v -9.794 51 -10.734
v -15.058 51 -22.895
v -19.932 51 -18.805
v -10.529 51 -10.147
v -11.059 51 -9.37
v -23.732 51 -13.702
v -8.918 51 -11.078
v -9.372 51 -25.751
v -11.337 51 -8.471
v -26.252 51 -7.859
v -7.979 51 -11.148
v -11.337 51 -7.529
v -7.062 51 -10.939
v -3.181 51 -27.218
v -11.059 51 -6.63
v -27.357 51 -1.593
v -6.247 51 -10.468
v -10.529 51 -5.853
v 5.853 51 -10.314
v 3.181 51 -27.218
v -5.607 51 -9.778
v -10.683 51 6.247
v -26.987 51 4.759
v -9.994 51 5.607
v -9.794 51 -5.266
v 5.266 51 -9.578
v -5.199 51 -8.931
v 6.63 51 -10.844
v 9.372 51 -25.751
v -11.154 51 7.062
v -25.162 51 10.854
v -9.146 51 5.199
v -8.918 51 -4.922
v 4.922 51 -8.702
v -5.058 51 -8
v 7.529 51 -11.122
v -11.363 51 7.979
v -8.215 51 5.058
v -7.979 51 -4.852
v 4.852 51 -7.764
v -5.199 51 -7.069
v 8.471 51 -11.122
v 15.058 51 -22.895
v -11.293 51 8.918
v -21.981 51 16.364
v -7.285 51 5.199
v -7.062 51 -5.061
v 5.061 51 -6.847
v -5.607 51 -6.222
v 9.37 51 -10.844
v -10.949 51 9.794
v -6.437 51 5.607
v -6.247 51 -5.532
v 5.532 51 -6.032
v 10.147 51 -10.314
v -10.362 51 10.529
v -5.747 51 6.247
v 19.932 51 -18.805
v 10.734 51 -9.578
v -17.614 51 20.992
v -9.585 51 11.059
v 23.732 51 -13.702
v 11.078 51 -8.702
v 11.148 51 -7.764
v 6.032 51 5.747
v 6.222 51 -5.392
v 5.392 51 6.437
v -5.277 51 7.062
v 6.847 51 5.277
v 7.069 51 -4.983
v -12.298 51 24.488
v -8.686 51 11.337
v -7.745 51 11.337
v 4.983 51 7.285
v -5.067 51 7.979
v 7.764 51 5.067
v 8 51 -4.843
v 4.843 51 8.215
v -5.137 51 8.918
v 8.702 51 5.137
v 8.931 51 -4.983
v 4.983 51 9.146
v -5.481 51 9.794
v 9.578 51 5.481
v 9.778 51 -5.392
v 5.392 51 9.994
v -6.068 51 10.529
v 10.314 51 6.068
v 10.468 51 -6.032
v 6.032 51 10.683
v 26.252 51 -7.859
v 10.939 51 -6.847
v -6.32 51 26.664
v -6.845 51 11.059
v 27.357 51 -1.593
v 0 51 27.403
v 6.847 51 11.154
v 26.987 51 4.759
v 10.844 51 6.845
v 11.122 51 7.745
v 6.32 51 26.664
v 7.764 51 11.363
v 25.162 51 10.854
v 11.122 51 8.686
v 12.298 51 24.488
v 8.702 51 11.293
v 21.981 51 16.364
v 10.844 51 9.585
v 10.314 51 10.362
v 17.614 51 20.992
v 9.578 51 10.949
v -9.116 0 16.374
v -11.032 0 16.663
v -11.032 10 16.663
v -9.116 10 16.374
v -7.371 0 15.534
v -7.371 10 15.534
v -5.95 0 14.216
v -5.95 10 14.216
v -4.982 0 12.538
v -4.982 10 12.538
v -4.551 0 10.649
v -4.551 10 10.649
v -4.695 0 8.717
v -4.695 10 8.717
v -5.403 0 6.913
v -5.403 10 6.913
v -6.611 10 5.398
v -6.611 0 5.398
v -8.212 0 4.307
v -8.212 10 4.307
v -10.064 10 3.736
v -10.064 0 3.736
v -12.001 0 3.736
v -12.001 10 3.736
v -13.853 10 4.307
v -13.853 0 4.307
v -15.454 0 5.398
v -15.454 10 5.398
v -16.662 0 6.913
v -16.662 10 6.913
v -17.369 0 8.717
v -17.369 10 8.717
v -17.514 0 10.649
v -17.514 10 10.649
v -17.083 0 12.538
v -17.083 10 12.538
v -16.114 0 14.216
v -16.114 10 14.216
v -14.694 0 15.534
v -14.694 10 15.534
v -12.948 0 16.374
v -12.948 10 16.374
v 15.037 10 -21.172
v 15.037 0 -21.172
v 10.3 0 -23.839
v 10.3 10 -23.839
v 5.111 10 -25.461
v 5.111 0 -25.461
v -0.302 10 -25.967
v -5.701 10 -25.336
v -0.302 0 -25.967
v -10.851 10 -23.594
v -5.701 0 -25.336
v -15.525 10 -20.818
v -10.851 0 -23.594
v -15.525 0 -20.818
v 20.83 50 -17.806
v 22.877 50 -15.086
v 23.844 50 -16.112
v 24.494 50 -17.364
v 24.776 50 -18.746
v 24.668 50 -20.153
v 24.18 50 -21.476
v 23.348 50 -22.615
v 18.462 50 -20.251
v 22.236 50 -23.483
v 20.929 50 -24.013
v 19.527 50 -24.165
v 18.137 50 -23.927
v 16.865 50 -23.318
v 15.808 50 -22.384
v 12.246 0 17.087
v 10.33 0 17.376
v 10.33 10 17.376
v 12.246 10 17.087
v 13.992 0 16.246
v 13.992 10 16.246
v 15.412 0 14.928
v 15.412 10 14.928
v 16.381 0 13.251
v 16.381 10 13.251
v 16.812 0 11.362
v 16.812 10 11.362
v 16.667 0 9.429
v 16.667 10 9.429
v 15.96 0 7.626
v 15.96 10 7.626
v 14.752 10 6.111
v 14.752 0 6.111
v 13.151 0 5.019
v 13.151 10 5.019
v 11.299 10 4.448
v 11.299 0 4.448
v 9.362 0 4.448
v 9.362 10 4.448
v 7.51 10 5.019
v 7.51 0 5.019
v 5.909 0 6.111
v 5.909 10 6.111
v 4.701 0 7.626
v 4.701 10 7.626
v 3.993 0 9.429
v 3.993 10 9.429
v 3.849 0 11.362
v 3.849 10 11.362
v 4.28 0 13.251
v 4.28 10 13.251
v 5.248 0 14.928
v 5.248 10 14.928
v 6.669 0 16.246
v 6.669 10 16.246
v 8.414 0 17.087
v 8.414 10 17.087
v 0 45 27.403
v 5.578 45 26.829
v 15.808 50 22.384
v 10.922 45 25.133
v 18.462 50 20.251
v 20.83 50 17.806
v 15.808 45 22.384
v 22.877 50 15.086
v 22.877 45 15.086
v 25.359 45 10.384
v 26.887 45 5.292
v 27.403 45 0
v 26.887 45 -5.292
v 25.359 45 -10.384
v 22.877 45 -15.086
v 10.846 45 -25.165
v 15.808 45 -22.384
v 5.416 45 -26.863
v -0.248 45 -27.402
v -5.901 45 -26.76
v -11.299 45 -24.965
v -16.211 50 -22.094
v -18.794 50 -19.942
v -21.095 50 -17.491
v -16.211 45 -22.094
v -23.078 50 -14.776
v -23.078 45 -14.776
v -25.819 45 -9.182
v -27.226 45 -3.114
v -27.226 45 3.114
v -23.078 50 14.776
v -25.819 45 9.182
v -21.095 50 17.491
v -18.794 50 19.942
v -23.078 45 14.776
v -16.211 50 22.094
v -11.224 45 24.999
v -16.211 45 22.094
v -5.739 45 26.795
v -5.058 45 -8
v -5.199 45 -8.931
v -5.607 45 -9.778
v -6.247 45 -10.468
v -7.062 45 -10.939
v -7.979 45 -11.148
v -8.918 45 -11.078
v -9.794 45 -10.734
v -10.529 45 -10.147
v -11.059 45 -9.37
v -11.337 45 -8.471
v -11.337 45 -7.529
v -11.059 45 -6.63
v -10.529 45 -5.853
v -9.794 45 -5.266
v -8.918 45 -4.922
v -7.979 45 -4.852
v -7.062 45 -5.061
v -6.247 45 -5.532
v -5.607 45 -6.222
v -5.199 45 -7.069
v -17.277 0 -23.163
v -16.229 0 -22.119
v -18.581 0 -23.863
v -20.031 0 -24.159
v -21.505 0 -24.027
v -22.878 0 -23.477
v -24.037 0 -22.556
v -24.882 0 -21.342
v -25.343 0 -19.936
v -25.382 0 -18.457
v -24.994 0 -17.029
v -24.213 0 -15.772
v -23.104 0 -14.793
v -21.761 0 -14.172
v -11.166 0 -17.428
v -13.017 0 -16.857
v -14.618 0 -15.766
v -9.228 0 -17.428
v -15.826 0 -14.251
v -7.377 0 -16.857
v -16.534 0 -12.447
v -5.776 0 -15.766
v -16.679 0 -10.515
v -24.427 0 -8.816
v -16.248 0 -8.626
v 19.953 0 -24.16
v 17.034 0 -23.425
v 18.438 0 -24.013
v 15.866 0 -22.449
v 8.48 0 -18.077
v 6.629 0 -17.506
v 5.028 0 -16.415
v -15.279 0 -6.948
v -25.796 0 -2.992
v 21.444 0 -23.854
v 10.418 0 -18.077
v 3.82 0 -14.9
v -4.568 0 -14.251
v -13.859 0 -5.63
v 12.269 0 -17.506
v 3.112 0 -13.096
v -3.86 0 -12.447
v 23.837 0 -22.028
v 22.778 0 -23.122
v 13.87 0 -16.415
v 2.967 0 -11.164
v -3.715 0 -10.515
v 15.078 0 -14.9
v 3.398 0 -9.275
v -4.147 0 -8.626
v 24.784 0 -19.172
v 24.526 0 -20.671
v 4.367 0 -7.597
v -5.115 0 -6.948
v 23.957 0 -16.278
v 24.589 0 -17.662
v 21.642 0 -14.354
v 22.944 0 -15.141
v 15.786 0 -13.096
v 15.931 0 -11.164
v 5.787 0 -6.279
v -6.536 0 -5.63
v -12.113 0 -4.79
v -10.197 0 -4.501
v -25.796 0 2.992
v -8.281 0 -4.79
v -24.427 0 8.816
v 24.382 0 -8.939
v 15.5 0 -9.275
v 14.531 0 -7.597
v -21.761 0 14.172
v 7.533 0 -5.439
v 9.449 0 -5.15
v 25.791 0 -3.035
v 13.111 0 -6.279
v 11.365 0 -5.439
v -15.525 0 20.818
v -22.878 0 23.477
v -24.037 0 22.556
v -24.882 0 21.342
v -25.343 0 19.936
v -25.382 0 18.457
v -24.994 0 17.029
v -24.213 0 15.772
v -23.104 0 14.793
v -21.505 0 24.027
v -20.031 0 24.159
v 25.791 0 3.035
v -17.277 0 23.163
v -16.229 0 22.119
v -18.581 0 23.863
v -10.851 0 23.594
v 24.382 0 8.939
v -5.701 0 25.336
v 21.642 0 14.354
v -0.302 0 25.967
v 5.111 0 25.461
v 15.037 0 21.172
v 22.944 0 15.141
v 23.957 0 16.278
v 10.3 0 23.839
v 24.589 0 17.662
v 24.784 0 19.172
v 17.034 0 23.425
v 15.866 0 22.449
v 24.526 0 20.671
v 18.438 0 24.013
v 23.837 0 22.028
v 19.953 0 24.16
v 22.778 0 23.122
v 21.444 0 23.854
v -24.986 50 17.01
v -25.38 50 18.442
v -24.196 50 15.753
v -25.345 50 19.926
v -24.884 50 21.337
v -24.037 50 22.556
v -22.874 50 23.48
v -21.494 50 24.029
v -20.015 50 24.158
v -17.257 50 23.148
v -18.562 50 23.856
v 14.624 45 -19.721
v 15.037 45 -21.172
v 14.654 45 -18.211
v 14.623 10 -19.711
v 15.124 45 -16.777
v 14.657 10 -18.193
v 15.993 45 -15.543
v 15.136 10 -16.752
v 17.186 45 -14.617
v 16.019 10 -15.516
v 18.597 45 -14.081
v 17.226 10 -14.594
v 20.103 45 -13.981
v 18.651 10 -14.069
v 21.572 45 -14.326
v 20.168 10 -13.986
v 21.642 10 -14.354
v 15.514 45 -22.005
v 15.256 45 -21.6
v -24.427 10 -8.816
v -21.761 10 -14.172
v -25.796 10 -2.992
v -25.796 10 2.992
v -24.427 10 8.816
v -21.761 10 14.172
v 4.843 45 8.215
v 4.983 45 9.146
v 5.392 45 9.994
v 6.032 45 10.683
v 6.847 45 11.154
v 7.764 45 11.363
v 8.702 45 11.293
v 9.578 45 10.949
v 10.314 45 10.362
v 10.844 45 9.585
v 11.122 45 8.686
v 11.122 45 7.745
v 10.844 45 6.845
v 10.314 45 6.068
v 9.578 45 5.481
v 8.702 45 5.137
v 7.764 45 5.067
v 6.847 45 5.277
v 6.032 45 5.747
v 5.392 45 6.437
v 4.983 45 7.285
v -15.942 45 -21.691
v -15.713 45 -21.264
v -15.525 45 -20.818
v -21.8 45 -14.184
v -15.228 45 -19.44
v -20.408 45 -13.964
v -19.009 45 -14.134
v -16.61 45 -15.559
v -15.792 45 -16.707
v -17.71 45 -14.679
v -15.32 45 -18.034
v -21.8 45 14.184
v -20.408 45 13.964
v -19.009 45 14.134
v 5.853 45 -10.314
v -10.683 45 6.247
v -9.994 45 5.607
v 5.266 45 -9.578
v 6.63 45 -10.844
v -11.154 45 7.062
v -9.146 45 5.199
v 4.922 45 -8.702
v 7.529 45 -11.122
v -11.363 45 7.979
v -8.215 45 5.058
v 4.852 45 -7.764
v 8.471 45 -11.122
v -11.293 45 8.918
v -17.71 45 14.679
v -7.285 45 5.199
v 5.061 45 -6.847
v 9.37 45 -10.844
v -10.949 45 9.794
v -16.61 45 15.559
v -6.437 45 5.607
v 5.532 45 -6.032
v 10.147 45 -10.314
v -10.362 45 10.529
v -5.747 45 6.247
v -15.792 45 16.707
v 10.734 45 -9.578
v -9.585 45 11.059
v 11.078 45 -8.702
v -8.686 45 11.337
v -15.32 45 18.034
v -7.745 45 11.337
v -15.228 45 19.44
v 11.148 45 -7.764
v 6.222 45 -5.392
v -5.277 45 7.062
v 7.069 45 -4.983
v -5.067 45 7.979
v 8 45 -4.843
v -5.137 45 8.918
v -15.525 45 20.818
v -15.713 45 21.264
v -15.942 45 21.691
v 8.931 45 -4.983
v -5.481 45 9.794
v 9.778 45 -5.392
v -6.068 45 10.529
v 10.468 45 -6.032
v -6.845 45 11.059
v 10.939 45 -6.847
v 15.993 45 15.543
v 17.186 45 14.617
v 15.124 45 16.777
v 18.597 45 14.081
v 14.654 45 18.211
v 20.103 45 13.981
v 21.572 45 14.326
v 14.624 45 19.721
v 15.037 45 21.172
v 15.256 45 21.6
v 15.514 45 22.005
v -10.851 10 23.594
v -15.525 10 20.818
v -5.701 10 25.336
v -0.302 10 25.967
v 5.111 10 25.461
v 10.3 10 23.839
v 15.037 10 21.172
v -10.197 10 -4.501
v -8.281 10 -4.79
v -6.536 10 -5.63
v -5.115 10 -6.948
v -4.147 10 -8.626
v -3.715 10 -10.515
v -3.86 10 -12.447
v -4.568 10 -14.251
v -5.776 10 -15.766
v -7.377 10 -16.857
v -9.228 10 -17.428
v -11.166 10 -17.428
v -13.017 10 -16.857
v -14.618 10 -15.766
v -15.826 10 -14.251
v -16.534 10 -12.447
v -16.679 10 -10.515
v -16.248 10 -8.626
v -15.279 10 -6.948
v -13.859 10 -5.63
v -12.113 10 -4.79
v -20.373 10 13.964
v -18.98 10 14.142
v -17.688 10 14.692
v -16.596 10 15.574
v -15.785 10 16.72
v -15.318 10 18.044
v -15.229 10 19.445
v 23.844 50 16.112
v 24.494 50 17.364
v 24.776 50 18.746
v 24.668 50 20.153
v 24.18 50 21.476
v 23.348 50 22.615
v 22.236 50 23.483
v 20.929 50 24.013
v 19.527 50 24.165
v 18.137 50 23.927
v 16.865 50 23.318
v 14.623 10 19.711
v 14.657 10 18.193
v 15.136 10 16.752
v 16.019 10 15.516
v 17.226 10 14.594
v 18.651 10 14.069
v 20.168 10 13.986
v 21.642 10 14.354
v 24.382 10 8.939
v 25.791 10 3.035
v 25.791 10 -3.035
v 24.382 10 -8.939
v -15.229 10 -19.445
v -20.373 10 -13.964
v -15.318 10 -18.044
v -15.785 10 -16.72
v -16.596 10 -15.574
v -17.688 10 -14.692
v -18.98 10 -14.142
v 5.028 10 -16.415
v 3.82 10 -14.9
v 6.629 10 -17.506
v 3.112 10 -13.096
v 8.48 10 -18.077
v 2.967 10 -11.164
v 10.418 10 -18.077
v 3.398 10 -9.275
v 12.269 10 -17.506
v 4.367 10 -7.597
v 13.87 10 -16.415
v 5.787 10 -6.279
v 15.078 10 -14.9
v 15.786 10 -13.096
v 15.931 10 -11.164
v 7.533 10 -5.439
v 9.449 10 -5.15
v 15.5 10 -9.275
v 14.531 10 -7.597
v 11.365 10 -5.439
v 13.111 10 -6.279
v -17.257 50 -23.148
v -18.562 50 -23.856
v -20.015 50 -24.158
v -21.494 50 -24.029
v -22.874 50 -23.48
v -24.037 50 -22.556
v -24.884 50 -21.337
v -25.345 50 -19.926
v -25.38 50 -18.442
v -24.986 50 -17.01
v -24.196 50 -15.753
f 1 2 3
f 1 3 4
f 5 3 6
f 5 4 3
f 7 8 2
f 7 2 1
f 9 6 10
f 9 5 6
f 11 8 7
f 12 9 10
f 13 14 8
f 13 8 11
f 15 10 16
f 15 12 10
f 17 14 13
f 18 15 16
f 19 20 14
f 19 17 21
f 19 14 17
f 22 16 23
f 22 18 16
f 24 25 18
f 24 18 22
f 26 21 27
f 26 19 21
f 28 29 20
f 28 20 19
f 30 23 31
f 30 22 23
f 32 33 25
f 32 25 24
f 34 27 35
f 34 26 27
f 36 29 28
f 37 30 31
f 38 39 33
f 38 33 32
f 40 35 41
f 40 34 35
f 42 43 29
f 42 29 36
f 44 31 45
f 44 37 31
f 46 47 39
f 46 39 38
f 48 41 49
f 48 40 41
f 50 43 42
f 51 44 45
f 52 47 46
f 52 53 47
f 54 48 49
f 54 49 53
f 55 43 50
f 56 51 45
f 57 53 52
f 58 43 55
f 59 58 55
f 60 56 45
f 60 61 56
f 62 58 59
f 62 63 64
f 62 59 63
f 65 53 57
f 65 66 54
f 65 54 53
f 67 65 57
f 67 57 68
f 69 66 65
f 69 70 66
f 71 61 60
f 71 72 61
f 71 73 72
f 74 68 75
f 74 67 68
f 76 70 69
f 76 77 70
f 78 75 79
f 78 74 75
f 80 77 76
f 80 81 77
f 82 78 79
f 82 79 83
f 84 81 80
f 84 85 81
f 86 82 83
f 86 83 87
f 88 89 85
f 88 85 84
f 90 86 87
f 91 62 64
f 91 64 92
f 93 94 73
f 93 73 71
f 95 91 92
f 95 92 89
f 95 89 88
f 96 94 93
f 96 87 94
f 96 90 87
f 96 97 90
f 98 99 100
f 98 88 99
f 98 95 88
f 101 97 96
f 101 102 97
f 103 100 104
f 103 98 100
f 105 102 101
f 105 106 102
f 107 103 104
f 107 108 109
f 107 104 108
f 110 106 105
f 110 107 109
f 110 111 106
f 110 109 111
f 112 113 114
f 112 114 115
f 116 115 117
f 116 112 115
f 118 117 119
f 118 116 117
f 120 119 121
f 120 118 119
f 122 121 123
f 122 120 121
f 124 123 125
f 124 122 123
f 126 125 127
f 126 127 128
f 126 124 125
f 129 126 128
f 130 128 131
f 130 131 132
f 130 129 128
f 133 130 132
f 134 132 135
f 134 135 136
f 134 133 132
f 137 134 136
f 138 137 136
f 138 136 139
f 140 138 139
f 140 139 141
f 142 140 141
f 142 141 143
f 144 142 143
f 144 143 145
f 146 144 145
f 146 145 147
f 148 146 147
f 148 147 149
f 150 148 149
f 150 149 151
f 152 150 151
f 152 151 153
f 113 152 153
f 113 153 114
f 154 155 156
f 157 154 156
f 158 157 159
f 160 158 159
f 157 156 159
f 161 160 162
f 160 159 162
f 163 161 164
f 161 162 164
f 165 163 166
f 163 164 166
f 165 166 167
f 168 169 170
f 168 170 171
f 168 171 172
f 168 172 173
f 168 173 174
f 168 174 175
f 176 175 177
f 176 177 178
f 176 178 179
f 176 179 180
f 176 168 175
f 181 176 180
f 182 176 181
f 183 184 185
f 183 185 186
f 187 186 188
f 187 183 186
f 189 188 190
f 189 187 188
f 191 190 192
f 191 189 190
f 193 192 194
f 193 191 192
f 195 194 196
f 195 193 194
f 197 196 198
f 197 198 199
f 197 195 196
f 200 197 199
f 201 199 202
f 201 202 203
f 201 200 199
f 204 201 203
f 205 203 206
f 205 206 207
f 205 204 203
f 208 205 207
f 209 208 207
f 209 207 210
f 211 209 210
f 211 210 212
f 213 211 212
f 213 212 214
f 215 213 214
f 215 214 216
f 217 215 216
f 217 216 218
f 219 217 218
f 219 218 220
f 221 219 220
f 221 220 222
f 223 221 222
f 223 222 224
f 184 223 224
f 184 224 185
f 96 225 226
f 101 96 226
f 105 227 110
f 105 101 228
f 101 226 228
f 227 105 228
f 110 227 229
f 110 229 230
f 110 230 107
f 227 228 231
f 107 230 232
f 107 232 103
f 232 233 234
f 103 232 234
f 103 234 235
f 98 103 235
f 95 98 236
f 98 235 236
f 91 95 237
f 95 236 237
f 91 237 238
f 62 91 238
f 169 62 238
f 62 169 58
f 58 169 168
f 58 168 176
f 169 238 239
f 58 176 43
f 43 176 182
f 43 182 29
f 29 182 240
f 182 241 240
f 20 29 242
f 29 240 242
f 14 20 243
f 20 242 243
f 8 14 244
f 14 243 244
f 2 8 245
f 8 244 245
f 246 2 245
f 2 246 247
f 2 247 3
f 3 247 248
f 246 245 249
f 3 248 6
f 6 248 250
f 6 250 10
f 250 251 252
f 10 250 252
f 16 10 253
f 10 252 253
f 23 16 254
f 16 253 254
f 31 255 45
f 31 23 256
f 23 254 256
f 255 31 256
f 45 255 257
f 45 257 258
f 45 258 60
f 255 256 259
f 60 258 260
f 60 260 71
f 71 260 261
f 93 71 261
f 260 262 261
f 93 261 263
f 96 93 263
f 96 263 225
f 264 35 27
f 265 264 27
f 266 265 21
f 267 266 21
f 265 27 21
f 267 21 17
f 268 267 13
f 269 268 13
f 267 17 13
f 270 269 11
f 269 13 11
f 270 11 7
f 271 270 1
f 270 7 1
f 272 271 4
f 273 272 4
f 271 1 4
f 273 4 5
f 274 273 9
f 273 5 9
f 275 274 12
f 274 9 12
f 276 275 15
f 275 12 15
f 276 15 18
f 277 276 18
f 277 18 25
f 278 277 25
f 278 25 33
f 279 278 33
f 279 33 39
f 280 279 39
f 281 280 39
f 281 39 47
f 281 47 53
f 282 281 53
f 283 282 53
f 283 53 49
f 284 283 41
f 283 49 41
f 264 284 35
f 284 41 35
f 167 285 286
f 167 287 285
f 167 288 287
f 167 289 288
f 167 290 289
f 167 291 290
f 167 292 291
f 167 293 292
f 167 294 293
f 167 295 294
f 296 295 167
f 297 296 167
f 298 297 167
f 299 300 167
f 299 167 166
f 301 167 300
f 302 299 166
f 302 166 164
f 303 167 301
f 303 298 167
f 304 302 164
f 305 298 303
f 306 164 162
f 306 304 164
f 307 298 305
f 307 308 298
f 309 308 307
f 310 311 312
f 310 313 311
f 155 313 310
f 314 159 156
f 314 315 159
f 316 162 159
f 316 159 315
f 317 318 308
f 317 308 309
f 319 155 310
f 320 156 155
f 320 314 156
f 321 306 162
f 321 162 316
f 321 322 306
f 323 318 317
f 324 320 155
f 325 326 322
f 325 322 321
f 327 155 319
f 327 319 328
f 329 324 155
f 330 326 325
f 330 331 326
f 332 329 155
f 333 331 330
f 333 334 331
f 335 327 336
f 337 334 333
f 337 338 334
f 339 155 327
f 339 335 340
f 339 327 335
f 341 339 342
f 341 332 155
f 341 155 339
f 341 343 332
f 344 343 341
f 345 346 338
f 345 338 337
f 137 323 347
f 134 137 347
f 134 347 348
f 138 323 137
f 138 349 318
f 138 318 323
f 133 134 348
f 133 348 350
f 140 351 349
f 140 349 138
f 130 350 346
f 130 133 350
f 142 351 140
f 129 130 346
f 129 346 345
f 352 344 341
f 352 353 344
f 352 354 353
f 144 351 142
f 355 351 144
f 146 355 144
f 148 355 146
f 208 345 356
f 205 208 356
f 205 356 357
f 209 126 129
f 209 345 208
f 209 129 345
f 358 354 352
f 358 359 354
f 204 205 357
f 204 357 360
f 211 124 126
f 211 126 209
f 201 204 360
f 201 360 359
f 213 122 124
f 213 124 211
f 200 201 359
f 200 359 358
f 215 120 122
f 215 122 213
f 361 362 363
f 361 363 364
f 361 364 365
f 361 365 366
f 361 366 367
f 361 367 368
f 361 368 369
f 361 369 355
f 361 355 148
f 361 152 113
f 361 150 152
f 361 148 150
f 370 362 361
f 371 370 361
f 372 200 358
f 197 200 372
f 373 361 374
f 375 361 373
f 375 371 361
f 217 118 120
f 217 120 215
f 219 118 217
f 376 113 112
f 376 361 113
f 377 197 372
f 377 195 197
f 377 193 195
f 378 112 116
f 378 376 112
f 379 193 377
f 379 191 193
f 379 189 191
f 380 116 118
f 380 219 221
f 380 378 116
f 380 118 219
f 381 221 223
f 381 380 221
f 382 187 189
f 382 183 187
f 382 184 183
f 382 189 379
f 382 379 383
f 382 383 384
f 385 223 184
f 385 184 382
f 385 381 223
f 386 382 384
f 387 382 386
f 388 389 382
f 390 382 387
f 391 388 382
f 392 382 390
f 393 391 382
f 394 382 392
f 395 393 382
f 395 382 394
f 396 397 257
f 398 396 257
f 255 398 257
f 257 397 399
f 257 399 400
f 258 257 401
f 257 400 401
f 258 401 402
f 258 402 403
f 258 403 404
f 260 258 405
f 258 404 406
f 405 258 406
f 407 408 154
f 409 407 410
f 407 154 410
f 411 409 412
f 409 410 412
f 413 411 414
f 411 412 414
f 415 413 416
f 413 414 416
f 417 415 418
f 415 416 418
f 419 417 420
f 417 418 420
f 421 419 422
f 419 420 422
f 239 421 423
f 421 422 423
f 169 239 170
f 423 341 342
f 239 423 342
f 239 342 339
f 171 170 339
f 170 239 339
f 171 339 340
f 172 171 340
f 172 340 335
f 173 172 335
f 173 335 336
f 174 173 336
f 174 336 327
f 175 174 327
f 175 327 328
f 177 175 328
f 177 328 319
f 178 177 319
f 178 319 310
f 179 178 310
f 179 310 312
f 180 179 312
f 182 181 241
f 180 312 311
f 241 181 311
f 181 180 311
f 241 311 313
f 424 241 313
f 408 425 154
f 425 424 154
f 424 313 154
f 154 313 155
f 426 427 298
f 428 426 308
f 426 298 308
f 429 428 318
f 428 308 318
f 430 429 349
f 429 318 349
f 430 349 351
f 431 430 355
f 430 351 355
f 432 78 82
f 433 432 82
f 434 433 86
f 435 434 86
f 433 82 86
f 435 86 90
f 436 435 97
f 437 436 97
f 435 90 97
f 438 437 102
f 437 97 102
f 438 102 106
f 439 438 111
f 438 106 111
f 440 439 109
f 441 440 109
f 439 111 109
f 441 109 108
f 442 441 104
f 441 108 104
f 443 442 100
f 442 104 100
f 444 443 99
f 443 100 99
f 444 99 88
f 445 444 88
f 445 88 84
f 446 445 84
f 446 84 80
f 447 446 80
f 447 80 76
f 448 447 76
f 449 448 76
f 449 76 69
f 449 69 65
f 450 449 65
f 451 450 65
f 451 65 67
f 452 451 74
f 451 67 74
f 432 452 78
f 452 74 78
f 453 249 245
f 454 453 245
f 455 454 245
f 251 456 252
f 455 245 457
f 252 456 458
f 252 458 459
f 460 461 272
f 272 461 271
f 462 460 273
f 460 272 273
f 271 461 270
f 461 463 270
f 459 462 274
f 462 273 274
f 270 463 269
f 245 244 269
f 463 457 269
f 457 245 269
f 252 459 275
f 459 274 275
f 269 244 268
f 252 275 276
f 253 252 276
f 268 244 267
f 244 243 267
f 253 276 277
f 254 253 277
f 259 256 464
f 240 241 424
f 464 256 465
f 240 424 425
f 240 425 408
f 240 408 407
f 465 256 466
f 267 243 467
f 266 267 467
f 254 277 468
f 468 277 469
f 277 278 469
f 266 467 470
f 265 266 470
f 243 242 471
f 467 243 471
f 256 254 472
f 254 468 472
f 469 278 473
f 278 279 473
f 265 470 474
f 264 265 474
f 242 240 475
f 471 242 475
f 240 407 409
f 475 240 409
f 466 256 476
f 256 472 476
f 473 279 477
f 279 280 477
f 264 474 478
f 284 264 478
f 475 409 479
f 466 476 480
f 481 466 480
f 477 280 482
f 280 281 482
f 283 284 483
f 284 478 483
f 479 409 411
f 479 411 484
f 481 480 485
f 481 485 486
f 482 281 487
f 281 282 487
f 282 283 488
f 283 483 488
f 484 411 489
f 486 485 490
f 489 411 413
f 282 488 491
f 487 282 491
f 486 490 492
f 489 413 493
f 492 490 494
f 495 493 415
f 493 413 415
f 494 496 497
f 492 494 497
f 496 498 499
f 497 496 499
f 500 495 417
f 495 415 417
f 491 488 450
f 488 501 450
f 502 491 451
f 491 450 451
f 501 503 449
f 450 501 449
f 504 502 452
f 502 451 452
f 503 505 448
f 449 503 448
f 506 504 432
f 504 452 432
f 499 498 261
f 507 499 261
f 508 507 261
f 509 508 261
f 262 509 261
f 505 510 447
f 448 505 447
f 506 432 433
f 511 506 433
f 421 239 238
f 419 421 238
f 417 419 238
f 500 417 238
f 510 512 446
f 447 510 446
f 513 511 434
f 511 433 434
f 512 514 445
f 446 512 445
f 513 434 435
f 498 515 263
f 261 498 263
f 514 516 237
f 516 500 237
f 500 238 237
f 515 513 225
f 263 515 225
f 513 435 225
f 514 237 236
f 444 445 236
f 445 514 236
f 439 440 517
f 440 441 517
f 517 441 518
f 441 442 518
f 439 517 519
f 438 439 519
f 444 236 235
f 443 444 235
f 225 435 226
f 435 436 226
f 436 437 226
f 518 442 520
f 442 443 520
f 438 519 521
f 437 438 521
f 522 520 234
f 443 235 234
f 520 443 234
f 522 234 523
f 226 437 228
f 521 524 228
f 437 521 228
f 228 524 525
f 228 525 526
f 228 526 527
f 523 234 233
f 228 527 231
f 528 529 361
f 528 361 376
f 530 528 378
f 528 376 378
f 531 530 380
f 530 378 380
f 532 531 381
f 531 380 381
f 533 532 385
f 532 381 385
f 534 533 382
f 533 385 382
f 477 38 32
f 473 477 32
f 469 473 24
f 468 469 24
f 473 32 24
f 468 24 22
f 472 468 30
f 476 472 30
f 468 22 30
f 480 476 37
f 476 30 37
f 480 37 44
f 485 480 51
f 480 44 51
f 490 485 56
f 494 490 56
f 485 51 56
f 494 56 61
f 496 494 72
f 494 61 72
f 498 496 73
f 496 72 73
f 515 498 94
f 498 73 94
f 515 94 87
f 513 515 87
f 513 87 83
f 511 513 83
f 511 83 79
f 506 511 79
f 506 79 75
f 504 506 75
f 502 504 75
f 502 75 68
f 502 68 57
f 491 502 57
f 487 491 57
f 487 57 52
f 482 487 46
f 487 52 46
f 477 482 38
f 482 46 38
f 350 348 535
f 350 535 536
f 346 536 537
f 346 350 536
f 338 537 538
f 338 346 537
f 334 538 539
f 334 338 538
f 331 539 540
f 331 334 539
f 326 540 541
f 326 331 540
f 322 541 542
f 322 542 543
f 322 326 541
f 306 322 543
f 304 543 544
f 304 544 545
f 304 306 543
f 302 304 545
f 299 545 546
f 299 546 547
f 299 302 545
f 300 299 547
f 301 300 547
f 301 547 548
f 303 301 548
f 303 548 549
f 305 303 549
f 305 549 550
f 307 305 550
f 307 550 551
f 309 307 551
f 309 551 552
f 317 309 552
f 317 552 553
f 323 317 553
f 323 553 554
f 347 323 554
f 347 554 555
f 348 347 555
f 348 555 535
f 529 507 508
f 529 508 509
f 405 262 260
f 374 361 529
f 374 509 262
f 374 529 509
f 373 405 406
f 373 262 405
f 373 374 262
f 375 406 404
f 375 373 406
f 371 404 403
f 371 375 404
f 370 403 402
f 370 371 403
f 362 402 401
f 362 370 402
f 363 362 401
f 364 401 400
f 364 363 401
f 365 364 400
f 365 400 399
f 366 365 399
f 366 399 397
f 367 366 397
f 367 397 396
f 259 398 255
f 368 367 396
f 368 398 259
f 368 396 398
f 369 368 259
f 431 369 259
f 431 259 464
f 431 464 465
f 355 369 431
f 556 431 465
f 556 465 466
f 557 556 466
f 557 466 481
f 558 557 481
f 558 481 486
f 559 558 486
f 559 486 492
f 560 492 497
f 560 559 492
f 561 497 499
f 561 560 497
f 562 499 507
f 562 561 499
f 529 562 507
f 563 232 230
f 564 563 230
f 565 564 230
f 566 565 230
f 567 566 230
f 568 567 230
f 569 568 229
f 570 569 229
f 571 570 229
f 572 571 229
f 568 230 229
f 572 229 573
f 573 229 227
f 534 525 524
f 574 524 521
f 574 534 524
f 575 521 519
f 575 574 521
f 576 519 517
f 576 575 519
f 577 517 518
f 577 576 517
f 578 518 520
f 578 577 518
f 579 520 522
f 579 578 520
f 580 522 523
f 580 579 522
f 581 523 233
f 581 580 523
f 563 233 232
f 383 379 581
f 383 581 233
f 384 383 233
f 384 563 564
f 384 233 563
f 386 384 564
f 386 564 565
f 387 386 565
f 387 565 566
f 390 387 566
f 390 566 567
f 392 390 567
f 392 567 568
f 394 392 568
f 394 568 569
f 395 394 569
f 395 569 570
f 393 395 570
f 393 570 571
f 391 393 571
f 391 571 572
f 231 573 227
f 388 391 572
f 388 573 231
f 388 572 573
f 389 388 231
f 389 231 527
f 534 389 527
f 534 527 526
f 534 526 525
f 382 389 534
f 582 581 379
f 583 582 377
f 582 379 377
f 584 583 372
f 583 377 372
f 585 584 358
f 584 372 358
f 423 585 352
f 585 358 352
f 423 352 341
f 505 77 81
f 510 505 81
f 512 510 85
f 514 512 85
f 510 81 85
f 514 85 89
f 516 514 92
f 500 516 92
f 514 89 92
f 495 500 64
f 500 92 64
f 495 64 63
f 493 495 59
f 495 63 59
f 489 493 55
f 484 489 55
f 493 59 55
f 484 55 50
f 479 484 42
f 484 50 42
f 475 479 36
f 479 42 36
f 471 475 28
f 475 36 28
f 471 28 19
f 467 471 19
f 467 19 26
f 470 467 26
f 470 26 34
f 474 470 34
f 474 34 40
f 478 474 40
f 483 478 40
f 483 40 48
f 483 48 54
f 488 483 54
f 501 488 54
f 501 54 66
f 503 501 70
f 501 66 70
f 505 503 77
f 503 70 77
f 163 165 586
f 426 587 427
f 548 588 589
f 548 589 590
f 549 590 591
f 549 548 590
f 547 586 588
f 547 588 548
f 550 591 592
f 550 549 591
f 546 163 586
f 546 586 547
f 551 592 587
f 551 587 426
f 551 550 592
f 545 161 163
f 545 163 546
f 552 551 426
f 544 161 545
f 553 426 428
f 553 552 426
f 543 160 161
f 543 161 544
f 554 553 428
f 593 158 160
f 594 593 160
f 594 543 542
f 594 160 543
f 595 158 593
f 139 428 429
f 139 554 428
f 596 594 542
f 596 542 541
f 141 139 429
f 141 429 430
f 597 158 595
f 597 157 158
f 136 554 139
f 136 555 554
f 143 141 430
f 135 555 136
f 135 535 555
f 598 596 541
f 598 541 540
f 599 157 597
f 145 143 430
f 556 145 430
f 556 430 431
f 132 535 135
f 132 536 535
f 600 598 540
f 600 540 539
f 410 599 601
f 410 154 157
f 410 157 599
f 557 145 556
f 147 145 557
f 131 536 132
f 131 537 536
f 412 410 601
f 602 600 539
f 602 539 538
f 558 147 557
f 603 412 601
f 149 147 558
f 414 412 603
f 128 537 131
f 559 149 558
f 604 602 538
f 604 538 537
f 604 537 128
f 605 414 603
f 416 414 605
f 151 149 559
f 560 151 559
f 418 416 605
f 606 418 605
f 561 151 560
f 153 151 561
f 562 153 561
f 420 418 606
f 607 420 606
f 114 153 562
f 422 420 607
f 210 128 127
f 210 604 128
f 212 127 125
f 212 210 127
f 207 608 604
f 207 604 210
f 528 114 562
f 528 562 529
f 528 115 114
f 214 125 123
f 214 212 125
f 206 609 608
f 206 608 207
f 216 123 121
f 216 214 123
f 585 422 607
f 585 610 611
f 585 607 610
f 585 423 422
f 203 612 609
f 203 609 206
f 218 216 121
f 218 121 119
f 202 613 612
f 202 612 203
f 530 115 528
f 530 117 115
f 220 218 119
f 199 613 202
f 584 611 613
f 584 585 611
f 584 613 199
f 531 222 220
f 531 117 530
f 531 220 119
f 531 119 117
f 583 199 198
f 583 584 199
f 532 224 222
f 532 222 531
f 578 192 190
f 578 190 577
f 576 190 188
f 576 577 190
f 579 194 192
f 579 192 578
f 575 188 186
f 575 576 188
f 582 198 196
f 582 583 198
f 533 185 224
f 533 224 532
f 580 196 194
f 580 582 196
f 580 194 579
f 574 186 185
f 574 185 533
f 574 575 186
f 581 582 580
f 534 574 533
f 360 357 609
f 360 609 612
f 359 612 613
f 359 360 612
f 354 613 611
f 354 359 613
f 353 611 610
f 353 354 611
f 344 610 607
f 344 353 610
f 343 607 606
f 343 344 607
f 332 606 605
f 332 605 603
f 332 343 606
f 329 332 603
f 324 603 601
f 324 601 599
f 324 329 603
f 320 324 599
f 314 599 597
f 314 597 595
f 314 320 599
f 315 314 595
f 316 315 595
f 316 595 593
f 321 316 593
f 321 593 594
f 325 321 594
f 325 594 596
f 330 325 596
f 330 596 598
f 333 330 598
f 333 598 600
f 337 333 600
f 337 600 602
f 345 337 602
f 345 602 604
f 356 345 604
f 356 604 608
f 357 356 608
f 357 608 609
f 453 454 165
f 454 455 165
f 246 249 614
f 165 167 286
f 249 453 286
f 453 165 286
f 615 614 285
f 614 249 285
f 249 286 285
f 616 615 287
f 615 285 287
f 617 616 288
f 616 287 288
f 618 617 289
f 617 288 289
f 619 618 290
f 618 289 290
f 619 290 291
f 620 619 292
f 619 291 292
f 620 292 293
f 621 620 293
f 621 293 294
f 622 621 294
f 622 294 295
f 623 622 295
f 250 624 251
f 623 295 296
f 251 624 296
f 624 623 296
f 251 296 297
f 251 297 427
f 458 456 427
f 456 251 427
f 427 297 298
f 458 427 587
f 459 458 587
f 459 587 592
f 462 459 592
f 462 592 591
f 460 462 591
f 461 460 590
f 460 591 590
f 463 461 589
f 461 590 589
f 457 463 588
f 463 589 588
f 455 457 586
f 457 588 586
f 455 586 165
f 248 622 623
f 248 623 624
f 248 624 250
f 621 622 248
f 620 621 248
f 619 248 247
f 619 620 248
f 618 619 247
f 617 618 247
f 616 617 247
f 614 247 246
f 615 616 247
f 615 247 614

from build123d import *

# Parameters (mm, degrees)
SKETCH1_R                = 25.969085179
BOSS_EXTRUDE1_DEPTH      = 10
CUT_EXTRUDE6_DEPTH       = 10
CUT_EXTRUDE6_DEPTH_BACK  = 10
SKETCH2_R                = 6.5
SKETCH4_R                = 5.101859566
BOSS_EXTRUDE2_DEPTH      = 50
BOSS_EXTRUDE3_DEPTH      = 1
BOSS_EXTRUDE3_DEPTH_BACK = 5
SKETCH5_R                = 27.403110043
SKETCH6_R                = 3.156893789
CUT_EXTRUDE7_DEPTH       = 6
CIRPATTERN1_COUNT        = 4


with BuildPart() as part:
    # Sketch1 → Boss-Extrude1 (new body)
    with BuildSketch(Plane(origin=(0, 0, 0), x_dir=(1, 0, 0), z_dir=(0, 1, 0))):
        with Locations(Location((0, 0, 0), (0, 0, 270))):
            Circle(SKETCH1_R)
    extrude(amount=BOSS_EXTRUDE1_DEPTH)

    # Sketch2 → Cut-Extrude6 (cut, two sides: drawn at the far end of the back side and taken through both)
    with BuildSketch(Plane(origin=(0, 0, 0), x_dir=(1, 0, 0), z_dir=(0, 1, 0)).offset(-CUT_EXTRUDE6_DEPTH_BACK)):
        with Locations(Location((-10.19719706, 11.000780524, 0), (0, 0, 270))):
            Circle(SKETCH2_R)
        with Locations(Location((-11.032390275, -10.162989955, 0), (0, 0, 270))):
            Circle(SKETCH2_R)
        with Locations(Location((10.330398744, -10.875792467, 0), (0, 0, 270))):
            Circle(SKETCH2_R)
        with Locations(Location((9.448943305, 11.649784136, 0), (0, 0, 270))):
            Circle(SKETCH2_R)
    extrude(amount=CUT_EXTRUDE6_DEPTH + CUT_EXTRUDE6_DEPTH_BACK, mode=Mode.SUBTRACT)

    # Sketch4 → Boss-Extrude2 (add)
    with BuildSketch(Plane(origin=(0, 0, 0), x_dir=(1, 0, 0), z_dir=(0, 1, 0))):
        with Locations(Location((-20.316325534, 19.065240611, 0), (0, 0, 20.088676174))):
            Circle(SKETCH4_R)
        with Locations(Location((19.683674466, 19.065240611, 0), (0, 0, 155.604859665))):
            Circle(SKETCH4_R)
    boss_extrude2 = extrude(amount=BOSS_EXTRUDE2_DEPTH)

    # Mirror1: Boss-Extrude2 across plane
    add(boss_extrude2.mirror(Plane.XY))

    # Sketch5 → Boss-Extrude3 (add, two sides: drawn at the far end of the back side and taken through both)
    with BuildSketch(Plane(origin=(0, 50, 0), x_dir=(1, 0, 0), z_dir=(0, 1, 0)).offset(-BOSS_EXTRUDE3_DEPTH_BACK)):
        with Locations(Location((0, 0, 0), (0, 0, 270))):
            Circle(SKETCH5_R)
    extrude(amount=BOSS_EXTRUDE3_DEPTH + BOSS_EXTRUDE3_DEPTH_BACK)

    # Sketch6 → Cut-Extrude7 (cut)
    with BuildSketch(Plane(origin=(0, 51, 0), x_dir=(1, 0, 0), z_dir=(0, 1, 0))):
        with Locations(Location((8, 8, 0), (0, 0, 270))):
            Circle(SKETCH6_R)
    cut_extrude7 = extrude(amount=-CUT_EXTRUDE7_DEPTH, mode=Mode.SUBTRACT)

    # CirPattern1: Cut-Extrude7 ×4 about axis
    cirpattern1_axis = Axis((-0.107600069, 0, 0.107600069), (0, 1, 0))
    for i in range(1, CIRPATTERN1_COUNT):
        add(cut_extrude7.rotate(cirpattern1_axis, i * 360 / CIRPATTERN1_COUNT), mode=Mode.SUBTRACT)


solid = part.part
